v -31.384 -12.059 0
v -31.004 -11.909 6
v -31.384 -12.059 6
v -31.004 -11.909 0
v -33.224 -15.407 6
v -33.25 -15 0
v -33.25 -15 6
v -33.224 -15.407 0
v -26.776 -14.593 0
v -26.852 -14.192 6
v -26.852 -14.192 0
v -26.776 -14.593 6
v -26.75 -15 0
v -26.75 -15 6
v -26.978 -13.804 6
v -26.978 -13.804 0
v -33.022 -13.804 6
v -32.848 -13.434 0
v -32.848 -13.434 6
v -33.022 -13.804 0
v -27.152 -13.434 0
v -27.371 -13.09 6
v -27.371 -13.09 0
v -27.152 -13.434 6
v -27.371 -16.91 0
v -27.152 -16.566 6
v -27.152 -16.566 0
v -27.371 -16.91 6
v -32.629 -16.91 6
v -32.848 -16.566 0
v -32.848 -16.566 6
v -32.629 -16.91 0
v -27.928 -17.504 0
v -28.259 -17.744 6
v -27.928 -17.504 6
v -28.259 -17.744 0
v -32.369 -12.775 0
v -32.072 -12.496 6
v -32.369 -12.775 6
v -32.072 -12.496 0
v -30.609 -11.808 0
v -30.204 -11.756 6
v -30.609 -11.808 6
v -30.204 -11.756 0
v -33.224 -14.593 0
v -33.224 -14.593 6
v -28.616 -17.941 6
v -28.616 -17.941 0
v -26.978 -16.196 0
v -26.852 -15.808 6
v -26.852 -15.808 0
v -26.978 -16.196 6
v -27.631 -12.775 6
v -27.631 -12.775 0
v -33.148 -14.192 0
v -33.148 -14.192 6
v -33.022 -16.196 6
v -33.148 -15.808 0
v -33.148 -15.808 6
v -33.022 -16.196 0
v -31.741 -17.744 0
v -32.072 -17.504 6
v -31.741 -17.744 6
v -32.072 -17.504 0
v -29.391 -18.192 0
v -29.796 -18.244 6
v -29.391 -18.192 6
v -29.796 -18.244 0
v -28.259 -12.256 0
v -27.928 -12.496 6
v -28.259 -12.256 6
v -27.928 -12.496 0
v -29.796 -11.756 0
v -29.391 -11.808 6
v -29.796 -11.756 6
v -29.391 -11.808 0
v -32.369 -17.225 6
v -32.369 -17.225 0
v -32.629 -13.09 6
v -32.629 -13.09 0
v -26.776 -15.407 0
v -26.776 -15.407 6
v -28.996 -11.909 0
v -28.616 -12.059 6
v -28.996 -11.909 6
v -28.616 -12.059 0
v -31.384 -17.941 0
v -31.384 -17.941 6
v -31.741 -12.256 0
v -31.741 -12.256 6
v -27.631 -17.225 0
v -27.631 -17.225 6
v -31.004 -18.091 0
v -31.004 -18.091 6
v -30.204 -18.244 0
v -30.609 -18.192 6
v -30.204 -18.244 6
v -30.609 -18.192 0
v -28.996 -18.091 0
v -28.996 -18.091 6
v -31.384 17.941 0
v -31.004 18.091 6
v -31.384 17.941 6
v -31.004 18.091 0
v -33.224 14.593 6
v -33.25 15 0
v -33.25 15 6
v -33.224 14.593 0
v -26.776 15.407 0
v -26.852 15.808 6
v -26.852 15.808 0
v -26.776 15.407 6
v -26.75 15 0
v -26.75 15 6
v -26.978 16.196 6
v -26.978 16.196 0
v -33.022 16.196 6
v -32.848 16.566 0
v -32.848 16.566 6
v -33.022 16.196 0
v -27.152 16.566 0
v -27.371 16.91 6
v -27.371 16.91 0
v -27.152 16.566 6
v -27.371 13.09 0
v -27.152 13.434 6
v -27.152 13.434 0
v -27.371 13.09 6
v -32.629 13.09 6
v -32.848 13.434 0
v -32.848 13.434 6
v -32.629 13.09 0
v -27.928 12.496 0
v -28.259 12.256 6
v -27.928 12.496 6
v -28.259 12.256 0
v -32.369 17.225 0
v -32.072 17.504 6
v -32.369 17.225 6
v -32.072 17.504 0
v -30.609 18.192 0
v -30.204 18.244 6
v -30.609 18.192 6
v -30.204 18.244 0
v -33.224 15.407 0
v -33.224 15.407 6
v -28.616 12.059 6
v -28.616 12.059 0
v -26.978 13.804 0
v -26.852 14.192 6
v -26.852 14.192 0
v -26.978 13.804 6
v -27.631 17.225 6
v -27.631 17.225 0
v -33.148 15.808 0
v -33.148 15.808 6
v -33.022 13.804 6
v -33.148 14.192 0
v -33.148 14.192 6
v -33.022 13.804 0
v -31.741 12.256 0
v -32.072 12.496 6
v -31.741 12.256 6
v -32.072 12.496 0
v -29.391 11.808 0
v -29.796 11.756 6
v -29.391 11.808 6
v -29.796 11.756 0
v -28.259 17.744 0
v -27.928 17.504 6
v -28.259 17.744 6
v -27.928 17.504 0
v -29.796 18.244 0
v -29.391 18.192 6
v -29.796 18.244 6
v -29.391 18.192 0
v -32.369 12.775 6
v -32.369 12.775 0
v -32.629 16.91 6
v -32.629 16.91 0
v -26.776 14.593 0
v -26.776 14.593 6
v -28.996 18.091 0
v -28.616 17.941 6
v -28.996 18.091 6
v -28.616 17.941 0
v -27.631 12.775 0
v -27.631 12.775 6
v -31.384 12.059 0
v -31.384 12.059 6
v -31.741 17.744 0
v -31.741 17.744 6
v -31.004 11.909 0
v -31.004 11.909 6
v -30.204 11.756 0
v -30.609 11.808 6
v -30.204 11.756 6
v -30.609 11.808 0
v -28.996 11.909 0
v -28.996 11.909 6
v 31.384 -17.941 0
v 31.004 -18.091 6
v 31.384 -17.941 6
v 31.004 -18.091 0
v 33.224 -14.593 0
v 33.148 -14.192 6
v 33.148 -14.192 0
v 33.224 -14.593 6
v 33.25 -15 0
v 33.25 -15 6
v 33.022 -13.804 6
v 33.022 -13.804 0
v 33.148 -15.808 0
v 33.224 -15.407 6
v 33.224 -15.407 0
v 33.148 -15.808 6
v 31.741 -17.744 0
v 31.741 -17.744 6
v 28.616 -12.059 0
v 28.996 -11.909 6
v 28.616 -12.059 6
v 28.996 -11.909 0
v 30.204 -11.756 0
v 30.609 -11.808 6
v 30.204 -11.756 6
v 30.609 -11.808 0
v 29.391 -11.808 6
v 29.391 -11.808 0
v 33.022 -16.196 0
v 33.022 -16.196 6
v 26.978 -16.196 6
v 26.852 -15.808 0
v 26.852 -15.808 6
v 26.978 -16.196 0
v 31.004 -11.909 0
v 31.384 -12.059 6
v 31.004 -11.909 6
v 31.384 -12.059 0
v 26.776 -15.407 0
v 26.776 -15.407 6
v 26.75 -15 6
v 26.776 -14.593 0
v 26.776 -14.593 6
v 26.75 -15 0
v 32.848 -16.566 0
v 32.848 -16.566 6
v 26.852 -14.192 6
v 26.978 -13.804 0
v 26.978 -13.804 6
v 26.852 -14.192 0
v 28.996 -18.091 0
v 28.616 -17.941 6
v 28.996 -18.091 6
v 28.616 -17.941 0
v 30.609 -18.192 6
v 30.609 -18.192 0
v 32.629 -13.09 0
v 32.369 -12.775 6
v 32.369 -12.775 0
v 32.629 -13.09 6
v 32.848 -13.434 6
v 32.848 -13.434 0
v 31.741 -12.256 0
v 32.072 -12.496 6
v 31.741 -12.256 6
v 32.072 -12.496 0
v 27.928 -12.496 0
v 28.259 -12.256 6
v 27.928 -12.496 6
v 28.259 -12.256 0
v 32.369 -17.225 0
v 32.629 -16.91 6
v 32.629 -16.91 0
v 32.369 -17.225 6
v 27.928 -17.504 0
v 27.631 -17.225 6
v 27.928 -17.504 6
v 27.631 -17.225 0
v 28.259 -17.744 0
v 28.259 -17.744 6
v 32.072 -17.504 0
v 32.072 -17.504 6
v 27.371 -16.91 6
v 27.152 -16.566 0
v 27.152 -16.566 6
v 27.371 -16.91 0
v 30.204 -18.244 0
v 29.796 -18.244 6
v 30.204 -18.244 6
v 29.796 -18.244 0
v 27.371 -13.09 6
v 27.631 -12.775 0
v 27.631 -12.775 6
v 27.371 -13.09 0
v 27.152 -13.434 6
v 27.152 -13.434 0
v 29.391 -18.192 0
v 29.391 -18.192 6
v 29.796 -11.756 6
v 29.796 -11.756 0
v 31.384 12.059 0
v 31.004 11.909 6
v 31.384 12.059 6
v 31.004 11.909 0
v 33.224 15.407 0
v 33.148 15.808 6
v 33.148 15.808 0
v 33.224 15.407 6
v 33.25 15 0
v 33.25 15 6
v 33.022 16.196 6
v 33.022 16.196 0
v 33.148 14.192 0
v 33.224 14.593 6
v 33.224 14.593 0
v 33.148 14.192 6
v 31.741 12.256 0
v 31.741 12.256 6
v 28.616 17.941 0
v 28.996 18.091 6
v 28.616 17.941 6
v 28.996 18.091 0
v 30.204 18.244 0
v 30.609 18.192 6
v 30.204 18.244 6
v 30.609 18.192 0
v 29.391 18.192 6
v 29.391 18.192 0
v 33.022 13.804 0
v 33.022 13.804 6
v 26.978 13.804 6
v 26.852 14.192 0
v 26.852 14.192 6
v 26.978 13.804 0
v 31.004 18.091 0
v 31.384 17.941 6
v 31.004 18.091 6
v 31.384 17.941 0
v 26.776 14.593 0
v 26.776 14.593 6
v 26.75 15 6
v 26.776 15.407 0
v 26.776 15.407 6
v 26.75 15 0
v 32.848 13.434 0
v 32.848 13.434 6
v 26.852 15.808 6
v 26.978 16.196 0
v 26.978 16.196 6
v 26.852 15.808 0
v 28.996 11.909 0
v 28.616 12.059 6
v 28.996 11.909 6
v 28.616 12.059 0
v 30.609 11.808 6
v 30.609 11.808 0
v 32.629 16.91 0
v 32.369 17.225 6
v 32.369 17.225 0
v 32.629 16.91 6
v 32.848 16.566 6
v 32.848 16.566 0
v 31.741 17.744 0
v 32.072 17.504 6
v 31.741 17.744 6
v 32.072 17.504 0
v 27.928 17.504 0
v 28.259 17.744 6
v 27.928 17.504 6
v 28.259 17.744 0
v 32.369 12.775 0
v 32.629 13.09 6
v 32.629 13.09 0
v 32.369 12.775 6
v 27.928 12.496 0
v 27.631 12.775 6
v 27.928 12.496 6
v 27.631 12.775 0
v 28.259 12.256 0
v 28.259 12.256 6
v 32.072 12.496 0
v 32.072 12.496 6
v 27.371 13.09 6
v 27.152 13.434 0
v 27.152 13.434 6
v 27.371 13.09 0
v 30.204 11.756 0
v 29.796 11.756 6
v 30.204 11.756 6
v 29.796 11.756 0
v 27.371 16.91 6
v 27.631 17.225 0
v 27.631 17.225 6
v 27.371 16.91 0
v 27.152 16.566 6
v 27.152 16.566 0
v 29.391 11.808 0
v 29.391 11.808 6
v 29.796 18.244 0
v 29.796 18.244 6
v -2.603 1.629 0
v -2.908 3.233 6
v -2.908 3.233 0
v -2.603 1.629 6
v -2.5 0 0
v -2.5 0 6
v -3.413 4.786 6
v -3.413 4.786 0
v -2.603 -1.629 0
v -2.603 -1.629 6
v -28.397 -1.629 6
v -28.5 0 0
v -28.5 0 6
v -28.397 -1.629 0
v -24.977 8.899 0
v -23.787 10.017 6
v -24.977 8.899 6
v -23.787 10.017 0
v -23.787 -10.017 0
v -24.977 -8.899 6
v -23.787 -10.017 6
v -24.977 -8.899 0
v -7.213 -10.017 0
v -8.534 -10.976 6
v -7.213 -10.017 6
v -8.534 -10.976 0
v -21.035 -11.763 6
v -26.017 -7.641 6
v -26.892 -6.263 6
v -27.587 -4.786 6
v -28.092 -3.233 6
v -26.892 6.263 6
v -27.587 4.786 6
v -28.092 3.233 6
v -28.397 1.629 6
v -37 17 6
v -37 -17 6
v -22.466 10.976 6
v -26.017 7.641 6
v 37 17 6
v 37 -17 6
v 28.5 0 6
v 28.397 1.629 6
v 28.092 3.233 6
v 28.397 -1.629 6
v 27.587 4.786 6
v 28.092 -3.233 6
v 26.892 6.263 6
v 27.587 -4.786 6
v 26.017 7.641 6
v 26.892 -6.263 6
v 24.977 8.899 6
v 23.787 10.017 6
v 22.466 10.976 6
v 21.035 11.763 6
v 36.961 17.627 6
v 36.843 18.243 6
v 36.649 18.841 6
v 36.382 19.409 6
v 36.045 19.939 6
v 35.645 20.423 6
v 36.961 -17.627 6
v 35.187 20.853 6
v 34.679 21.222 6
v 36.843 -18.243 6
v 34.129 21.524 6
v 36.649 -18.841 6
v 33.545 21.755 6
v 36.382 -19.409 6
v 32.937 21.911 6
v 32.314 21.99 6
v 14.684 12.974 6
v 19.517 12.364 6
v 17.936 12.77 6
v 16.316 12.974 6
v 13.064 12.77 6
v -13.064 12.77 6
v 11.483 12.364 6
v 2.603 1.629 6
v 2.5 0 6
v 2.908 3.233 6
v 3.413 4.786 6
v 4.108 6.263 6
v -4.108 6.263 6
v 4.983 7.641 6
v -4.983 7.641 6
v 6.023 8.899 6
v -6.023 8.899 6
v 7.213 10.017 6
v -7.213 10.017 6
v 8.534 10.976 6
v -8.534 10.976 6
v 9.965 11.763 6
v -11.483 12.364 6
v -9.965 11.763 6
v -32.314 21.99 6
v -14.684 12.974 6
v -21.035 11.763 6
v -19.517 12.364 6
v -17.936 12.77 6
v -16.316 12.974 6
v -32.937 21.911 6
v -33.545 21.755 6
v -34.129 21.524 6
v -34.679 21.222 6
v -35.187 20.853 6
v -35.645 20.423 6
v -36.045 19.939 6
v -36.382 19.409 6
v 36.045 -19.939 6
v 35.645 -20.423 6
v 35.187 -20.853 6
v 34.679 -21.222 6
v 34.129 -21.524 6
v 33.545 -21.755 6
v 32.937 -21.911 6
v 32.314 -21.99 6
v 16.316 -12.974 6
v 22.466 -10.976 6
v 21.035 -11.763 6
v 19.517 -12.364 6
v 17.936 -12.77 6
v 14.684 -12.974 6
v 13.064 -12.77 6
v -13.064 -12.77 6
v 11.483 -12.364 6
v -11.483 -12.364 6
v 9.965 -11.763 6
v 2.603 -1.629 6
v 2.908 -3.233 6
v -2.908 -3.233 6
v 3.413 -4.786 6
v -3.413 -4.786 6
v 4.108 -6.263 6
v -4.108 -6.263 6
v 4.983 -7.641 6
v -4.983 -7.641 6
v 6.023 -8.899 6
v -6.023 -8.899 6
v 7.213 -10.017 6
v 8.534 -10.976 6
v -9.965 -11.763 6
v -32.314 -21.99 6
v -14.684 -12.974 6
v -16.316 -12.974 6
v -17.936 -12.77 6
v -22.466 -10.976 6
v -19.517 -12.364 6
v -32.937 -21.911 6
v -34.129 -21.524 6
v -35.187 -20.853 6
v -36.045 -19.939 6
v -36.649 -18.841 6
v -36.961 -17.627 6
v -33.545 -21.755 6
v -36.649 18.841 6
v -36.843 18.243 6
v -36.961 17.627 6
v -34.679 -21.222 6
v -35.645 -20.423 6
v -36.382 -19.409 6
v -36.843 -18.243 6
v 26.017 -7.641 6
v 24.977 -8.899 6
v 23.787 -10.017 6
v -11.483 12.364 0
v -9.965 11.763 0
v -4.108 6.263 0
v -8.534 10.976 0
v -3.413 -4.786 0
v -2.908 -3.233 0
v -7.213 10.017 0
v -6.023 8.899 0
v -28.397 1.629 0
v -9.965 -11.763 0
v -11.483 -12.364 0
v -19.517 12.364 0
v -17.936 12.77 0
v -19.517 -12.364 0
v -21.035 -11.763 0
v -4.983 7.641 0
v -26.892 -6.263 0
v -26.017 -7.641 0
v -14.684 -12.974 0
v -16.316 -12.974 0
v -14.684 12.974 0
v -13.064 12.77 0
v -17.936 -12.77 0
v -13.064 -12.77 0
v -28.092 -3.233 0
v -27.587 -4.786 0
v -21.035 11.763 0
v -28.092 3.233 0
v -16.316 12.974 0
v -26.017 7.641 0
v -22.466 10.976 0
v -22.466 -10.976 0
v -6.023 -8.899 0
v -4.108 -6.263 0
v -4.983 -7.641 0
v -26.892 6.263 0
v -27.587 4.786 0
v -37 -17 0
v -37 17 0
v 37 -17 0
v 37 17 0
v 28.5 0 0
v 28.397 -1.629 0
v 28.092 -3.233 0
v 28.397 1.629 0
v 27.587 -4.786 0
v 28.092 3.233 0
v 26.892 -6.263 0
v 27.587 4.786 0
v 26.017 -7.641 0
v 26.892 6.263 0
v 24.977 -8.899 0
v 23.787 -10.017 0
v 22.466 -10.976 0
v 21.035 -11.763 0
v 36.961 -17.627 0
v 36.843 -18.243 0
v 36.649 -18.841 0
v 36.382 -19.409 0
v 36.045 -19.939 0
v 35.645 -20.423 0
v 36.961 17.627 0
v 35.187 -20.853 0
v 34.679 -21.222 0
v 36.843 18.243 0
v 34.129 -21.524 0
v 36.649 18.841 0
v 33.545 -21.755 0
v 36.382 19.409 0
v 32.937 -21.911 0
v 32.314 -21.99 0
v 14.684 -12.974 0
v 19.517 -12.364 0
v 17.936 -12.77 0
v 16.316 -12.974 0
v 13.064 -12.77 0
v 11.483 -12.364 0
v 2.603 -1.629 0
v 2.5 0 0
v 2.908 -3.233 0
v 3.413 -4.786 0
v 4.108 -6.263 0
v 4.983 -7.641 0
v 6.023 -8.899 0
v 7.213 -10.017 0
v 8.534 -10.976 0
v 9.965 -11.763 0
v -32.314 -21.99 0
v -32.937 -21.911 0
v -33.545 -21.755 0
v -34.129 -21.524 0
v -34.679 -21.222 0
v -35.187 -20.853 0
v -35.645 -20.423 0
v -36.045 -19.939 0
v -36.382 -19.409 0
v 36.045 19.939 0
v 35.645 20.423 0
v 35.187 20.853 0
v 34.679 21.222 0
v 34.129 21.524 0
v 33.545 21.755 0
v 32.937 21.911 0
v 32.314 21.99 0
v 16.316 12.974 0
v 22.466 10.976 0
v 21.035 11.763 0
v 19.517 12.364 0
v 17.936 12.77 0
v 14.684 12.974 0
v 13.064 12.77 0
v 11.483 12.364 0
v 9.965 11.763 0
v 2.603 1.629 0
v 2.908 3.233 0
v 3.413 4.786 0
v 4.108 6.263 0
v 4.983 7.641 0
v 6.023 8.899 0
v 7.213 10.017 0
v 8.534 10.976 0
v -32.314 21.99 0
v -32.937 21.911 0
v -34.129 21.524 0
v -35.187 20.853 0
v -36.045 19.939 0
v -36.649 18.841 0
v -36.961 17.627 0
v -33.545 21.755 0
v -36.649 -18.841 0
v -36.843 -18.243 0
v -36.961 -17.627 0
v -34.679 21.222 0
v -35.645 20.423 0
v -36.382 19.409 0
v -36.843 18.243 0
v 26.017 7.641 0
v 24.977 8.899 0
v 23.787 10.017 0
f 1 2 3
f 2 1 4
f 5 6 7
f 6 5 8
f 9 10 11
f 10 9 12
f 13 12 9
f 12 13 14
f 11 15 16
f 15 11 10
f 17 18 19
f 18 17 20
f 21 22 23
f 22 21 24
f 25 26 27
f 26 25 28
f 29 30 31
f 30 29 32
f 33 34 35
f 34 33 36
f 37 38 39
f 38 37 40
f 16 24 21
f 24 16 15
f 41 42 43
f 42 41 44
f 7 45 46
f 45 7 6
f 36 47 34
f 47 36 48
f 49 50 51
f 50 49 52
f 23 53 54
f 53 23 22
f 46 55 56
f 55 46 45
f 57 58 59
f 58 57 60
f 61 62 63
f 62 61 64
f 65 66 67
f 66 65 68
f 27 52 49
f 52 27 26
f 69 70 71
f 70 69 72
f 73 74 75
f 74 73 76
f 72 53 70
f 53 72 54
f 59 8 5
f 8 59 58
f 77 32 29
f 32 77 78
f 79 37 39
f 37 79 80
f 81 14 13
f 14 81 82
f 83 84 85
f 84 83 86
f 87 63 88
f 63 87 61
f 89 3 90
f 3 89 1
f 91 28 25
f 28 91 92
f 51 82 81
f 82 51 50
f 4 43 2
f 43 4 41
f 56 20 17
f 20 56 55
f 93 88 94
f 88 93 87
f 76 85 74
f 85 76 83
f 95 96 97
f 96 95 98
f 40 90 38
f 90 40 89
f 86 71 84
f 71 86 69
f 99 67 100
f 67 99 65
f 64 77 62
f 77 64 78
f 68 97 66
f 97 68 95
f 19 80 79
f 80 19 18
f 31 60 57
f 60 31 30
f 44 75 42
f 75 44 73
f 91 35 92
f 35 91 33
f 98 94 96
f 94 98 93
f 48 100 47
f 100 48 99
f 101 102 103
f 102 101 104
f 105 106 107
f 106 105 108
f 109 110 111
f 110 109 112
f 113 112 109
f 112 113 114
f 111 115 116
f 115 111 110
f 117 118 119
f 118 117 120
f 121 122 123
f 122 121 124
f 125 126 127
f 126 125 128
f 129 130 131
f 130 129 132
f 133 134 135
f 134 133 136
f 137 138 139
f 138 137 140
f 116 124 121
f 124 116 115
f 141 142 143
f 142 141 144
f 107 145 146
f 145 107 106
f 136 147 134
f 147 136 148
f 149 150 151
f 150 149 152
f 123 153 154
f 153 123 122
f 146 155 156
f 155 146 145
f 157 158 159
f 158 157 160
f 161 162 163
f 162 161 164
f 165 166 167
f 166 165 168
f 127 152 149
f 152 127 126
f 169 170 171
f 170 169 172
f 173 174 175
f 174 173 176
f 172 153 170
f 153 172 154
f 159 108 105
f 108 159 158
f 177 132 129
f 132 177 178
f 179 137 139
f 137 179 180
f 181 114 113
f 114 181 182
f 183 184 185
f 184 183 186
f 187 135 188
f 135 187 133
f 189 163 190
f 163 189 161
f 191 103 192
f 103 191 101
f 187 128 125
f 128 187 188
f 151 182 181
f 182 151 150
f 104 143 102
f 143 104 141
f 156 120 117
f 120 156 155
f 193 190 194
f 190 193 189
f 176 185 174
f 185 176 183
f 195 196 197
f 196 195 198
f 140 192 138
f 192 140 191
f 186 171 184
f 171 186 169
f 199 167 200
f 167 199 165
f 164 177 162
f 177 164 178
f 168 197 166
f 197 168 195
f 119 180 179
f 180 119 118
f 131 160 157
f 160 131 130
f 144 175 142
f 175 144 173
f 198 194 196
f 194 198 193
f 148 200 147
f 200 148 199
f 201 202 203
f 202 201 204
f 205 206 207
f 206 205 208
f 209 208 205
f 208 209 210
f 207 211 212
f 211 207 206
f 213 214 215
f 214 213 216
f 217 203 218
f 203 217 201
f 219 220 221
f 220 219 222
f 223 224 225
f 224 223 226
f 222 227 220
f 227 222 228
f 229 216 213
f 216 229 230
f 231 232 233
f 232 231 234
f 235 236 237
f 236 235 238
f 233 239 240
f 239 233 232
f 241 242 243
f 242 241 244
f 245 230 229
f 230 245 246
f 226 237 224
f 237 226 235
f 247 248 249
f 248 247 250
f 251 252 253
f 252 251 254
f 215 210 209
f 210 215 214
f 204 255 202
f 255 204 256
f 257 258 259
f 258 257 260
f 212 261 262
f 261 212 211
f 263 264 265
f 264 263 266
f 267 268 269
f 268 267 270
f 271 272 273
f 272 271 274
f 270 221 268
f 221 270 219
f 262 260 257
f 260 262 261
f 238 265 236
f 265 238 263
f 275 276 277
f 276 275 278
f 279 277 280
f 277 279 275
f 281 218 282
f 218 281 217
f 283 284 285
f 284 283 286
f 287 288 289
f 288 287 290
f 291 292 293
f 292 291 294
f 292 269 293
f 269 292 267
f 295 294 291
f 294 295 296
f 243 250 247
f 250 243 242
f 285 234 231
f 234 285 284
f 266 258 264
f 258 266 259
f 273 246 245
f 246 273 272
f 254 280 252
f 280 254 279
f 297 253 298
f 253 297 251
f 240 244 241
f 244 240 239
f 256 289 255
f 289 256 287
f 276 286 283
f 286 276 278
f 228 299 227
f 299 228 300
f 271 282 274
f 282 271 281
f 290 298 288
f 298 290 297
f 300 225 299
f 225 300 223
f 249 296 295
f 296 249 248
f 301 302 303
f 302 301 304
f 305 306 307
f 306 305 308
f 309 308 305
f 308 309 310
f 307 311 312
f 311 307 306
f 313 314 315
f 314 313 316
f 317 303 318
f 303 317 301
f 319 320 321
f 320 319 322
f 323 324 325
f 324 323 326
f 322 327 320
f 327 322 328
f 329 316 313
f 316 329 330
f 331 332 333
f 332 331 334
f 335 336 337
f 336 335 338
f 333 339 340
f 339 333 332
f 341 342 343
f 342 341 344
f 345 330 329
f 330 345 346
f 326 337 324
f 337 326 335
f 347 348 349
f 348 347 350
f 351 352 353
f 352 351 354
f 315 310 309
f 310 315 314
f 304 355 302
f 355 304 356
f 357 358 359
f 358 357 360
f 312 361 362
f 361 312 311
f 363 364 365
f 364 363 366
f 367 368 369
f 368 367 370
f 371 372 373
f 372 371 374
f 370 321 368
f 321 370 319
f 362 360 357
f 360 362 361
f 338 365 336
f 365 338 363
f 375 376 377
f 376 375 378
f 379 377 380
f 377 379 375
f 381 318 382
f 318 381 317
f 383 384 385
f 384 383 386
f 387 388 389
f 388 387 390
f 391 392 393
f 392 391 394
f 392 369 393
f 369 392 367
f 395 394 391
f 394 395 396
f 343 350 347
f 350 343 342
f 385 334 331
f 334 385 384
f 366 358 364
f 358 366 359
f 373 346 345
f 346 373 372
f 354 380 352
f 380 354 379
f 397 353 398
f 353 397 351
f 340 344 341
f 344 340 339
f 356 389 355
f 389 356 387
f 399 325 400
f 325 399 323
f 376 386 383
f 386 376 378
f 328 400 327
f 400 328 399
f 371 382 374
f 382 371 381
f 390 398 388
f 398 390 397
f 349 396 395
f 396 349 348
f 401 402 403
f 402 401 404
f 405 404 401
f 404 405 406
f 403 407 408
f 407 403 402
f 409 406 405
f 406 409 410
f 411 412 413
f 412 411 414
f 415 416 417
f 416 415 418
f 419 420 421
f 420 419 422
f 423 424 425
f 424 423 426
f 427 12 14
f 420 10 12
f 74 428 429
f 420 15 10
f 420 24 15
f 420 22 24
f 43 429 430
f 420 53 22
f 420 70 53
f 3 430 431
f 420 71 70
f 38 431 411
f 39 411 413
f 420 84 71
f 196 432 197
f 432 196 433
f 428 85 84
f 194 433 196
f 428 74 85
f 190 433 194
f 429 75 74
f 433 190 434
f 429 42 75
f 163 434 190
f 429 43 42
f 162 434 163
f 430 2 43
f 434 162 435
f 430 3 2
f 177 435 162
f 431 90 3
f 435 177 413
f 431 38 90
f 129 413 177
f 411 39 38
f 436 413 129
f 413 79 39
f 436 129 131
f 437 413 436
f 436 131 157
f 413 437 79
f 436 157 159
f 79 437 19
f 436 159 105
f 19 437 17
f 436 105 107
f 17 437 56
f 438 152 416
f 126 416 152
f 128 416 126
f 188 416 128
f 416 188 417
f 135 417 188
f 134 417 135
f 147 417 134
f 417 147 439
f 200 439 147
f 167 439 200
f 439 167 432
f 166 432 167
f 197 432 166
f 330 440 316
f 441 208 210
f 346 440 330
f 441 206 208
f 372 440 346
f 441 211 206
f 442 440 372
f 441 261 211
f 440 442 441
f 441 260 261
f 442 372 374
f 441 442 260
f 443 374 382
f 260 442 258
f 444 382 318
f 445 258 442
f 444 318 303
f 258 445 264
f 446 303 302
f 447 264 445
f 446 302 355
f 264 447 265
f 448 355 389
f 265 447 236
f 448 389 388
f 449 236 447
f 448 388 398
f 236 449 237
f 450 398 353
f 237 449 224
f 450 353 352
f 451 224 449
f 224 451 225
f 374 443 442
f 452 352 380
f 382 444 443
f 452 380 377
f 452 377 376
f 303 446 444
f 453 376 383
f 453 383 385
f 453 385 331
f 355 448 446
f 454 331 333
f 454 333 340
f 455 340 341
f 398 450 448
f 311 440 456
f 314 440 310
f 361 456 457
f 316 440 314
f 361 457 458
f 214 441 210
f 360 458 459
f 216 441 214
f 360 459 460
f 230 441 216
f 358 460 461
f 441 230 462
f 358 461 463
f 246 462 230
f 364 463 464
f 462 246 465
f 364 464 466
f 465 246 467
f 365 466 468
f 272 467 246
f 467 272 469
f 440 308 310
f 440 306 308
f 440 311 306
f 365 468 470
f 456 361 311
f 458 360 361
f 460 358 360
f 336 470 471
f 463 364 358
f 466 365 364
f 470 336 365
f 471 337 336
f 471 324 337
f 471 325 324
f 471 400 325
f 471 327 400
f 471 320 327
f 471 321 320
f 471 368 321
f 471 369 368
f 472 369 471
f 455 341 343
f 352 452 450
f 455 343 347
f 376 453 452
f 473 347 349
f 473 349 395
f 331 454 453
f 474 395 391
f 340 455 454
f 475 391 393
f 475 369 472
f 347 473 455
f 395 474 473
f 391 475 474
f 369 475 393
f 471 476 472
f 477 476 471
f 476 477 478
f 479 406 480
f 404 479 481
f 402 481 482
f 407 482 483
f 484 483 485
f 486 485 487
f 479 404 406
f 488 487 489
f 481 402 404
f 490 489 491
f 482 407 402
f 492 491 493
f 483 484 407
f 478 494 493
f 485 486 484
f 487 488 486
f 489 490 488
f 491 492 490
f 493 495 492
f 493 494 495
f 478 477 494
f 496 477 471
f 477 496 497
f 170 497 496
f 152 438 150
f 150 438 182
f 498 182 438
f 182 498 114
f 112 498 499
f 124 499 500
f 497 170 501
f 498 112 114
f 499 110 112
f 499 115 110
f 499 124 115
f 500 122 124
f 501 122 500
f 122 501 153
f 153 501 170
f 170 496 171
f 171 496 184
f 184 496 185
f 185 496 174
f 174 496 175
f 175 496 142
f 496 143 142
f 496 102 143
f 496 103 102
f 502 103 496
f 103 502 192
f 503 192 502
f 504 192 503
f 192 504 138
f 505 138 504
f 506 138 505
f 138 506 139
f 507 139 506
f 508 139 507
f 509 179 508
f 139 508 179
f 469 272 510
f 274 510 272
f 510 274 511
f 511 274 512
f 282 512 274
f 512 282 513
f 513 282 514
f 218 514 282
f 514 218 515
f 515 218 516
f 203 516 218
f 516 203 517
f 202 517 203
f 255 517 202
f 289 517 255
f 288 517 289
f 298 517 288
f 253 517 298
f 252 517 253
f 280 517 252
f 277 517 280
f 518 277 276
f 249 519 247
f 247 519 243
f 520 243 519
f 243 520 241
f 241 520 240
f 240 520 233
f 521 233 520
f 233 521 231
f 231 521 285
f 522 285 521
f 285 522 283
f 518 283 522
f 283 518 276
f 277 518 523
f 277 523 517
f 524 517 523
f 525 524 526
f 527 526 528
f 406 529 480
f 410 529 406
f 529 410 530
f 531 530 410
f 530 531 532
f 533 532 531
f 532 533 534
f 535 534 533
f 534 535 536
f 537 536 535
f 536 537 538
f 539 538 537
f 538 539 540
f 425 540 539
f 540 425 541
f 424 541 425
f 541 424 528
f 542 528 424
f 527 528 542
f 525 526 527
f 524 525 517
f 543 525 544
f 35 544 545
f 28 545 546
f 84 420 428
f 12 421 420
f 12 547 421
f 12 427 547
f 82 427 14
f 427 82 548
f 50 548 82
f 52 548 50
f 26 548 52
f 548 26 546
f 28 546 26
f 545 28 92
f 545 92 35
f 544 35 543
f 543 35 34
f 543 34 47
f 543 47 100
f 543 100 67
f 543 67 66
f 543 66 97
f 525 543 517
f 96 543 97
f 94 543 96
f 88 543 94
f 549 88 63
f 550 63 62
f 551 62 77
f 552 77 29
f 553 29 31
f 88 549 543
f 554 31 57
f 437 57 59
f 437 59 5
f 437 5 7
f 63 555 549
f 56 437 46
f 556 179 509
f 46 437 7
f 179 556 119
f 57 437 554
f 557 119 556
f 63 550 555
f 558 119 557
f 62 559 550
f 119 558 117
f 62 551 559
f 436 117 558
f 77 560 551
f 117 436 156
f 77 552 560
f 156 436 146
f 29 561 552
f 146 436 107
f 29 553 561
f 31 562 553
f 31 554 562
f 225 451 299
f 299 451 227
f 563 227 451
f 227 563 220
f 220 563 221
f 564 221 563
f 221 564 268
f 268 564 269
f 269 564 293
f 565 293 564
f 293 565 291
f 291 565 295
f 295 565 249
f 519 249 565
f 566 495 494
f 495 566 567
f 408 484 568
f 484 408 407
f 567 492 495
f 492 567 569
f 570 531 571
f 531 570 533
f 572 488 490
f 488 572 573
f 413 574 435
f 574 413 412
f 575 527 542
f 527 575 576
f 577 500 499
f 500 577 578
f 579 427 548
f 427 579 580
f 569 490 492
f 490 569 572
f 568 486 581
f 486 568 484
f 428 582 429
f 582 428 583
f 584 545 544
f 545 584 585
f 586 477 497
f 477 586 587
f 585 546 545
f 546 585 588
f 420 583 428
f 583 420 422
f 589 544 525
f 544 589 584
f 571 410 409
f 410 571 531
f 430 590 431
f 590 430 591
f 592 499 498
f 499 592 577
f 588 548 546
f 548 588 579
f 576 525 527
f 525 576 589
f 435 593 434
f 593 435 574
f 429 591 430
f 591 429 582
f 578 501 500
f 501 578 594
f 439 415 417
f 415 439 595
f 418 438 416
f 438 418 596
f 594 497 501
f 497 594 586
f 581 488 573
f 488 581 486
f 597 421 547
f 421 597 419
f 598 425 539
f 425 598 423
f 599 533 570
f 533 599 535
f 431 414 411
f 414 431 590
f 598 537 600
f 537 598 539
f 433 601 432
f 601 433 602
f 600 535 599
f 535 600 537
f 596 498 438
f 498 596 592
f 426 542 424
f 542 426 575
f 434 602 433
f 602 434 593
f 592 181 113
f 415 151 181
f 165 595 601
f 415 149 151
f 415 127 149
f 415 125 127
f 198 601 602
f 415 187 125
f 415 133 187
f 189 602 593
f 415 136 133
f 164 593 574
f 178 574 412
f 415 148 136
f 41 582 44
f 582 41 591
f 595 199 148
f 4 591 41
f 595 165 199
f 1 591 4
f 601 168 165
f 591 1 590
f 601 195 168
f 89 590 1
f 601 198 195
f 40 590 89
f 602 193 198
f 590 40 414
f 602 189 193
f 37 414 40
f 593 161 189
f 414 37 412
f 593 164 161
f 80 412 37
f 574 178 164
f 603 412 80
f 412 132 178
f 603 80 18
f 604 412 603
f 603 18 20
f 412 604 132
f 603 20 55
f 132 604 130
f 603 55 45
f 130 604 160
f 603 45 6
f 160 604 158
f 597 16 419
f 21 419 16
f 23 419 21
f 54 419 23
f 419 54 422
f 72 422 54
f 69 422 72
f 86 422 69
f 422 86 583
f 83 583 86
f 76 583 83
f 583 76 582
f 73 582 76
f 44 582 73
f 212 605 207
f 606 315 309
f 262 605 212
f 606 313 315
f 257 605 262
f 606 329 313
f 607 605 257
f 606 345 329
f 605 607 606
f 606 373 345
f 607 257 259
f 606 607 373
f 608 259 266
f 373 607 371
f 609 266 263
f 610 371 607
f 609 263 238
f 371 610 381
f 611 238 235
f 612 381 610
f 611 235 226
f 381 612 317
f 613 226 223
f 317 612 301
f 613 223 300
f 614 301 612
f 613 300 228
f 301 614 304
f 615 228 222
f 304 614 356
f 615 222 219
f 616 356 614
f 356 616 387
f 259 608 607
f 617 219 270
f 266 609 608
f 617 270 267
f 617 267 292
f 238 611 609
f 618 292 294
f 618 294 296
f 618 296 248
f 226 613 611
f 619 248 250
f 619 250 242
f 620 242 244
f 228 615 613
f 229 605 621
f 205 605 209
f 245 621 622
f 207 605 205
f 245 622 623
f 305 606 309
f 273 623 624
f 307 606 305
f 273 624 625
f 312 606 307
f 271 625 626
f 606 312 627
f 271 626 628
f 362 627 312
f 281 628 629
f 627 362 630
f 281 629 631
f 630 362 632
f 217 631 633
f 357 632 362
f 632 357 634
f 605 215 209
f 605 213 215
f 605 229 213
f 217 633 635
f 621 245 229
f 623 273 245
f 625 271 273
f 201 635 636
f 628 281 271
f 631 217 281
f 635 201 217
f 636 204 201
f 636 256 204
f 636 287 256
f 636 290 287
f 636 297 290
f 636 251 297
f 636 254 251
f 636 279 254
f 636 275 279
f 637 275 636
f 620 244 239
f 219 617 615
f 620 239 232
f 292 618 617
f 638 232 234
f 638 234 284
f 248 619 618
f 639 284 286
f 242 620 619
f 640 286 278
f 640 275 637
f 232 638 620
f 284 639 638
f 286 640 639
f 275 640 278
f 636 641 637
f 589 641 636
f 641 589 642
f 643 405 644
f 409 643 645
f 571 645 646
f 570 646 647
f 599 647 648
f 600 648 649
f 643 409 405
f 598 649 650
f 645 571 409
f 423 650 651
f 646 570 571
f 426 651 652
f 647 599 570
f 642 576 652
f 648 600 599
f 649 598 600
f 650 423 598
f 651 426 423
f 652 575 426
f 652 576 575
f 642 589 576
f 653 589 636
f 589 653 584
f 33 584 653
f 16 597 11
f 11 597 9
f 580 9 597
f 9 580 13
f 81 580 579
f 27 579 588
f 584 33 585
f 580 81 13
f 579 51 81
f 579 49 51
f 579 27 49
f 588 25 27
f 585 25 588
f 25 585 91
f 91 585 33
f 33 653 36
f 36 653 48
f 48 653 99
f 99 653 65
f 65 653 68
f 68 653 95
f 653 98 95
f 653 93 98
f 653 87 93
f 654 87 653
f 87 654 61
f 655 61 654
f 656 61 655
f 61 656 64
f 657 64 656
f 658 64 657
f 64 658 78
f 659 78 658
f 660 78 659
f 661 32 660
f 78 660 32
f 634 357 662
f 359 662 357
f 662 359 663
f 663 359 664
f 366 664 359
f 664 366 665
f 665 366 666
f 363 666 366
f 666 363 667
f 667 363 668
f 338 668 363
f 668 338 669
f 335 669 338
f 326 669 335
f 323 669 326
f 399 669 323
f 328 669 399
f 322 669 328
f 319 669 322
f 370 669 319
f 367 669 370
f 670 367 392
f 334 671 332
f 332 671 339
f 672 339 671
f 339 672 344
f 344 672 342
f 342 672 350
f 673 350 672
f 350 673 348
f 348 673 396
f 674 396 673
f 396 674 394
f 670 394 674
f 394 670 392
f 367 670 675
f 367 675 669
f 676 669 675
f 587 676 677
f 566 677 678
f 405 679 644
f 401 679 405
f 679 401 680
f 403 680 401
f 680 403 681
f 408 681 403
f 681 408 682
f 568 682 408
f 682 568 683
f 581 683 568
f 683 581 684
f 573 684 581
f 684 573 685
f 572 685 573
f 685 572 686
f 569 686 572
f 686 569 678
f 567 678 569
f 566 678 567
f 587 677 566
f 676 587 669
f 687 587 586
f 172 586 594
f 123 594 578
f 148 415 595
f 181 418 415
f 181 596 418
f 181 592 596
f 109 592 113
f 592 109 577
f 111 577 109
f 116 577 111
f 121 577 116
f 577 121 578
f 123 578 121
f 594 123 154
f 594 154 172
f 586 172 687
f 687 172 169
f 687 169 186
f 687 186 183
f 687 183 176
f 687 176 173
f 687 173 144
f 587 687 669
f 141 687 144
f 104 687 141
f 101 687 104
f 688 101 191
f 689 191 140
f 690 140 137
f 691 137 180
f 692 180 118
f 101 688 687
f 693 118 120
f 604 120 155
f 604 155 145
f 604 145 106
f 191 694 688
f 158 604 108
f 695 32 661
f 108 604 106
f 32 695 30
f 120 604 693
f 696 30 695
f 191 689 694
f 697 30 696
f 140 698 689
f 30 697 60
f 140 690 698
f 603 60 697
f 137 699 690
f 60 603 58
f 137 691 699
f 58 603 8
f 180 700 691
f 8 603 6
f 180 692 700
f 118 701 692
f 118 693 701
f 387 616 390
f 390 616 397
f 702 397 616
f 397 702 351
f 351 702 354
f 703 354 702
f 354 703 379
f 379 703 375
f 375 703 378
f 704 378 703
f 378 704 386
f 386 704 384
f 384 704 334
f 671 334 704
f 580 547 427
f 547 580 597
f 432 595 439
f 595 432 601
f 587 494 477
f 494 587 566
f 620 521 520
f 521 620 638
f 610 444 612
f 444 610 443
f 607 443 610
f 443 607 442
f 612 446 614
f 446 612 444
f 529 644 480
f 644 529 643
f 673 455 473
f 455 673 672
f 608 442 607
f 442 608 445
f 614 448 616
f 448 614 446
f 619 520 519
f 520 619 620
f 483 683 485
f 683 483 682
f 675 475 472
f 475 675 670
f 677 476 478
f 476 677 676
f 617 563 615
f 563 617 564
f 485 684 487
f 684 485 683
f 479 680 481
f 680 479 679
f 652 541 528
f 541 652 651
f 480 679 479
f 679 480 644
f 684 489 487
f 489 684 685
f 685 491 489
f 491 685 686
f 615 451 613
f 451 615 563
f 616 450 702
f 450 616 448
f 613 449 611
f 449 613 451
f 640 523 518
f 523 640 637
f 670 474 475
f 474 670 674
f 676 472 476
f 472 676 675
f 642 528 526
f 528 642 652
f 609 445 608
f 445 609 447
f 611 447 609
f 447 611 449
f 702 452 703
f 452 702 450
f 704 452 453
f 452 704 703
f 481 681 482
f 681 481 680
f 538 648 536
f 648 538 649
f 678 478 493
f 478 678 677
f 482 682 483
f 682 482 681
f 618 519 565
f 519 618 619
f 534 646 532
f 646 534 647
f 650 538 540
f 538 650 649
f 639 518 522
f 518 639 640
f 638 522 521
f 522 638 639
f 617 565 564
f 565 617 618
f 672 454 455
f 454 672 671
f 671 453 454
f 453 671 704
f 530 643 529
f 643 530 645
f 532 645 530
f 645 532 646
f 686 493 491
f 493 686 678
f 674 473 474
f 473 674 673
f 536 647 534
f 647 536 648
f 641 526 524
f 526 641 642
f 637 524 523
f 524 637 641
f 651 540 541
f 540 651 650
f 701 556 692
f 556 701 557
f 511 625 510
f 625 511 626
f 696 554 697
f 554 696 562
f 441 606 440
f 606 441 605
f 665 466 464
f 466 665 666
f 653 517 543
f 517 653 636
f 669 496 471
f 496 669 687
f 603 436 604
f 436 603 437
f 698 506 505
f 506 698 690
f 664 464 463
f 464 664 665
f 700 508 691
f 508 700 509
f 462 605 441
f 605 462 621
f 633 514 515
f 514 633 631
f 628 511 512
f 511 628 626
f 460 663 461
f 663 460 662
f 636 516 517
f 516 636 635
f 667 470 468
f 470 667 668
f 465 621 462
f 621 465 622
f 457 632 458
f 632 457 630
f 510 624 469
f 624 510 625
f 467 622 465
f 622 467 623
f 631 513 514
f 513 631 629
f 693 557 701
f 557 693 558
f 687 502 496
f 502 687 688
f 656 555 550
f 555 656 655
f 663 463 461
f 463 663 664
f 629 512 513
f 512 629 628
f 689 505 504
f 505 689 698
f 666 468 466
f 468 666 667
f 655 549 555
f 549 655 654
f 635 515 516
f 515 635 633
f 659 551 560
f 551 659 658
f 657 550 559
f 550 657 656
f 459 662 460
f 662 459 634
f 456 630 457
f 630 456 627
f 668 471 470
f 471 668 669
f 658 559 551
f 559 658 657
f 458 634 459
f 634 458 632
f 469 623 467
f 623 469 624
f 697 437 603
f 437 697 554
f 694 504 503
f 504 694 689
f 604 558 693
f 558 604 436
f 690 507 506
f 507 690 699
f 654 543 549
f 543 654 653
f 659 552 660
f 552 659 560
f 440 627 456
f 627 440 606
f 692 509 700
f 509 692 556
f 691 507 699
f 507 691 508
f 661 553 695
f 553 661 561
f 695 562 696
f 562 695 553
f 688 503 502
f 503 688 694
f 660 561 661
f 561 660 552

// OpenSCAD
$fn = 50;

difference() {
	union() {
		hull() {
			translate(v = [-32.0, 17.0, 0]) {
				cylinder(h = 6, r = 5);
			}
			translate(v = [32.0, 17.0, 0]) {
				cylinder(h = 6, r = 5);
			}
			translate(v = [-32.0, -17.0, 0]) {
				cylinder(h = 6, r = 5);
			}
			translate(v = [32.0, -17.0, 0]) {
				cylinder(h = 6, r = 5);
			}
		}
	}
	union() {
		translate(v = [-30.0, -15.0, -100.0]) {
			cylinder(h = 200, r = 3.25);
		}
		translate(v = [-30.0, 15.0, -100.0]) {
			cylinder(h = 200, r = 3.25);
		}
		translate(v = [30.0, -15.0, -100.0]) {
			cylinder(h = 200, r = 3.25);
		}
		translate(v = [30.0, 15.0, -100.0]) {
			cylinder(h = 200, r = 3.25);
		}
		translate(v = [-30.0, -15.0, -100.0]) {
			cylinder(h = 200, r = 1.8);
		}
		translate(v = [-30.0, 15.0, -100.0]) {
			cylinder(h = 200, r = 1.8);
		}
		translate(v = [30.0, -15.0, -100.0]) {
			cylinder(h = 200, r = 1.8);
		}
		translate(v = [30.0, 15.0, -100.0]) {
			cylinder(h = 200, r = 1.8);
		}
		translate(v = [-15.5, 0, 0.0]) {
			cylinder(h = 6, r = 13.0);
		}
		translate(v = [15.5, 0, 0.0]) {
			cylinder(h = 6, r = 13.0);
		}
	}
}
